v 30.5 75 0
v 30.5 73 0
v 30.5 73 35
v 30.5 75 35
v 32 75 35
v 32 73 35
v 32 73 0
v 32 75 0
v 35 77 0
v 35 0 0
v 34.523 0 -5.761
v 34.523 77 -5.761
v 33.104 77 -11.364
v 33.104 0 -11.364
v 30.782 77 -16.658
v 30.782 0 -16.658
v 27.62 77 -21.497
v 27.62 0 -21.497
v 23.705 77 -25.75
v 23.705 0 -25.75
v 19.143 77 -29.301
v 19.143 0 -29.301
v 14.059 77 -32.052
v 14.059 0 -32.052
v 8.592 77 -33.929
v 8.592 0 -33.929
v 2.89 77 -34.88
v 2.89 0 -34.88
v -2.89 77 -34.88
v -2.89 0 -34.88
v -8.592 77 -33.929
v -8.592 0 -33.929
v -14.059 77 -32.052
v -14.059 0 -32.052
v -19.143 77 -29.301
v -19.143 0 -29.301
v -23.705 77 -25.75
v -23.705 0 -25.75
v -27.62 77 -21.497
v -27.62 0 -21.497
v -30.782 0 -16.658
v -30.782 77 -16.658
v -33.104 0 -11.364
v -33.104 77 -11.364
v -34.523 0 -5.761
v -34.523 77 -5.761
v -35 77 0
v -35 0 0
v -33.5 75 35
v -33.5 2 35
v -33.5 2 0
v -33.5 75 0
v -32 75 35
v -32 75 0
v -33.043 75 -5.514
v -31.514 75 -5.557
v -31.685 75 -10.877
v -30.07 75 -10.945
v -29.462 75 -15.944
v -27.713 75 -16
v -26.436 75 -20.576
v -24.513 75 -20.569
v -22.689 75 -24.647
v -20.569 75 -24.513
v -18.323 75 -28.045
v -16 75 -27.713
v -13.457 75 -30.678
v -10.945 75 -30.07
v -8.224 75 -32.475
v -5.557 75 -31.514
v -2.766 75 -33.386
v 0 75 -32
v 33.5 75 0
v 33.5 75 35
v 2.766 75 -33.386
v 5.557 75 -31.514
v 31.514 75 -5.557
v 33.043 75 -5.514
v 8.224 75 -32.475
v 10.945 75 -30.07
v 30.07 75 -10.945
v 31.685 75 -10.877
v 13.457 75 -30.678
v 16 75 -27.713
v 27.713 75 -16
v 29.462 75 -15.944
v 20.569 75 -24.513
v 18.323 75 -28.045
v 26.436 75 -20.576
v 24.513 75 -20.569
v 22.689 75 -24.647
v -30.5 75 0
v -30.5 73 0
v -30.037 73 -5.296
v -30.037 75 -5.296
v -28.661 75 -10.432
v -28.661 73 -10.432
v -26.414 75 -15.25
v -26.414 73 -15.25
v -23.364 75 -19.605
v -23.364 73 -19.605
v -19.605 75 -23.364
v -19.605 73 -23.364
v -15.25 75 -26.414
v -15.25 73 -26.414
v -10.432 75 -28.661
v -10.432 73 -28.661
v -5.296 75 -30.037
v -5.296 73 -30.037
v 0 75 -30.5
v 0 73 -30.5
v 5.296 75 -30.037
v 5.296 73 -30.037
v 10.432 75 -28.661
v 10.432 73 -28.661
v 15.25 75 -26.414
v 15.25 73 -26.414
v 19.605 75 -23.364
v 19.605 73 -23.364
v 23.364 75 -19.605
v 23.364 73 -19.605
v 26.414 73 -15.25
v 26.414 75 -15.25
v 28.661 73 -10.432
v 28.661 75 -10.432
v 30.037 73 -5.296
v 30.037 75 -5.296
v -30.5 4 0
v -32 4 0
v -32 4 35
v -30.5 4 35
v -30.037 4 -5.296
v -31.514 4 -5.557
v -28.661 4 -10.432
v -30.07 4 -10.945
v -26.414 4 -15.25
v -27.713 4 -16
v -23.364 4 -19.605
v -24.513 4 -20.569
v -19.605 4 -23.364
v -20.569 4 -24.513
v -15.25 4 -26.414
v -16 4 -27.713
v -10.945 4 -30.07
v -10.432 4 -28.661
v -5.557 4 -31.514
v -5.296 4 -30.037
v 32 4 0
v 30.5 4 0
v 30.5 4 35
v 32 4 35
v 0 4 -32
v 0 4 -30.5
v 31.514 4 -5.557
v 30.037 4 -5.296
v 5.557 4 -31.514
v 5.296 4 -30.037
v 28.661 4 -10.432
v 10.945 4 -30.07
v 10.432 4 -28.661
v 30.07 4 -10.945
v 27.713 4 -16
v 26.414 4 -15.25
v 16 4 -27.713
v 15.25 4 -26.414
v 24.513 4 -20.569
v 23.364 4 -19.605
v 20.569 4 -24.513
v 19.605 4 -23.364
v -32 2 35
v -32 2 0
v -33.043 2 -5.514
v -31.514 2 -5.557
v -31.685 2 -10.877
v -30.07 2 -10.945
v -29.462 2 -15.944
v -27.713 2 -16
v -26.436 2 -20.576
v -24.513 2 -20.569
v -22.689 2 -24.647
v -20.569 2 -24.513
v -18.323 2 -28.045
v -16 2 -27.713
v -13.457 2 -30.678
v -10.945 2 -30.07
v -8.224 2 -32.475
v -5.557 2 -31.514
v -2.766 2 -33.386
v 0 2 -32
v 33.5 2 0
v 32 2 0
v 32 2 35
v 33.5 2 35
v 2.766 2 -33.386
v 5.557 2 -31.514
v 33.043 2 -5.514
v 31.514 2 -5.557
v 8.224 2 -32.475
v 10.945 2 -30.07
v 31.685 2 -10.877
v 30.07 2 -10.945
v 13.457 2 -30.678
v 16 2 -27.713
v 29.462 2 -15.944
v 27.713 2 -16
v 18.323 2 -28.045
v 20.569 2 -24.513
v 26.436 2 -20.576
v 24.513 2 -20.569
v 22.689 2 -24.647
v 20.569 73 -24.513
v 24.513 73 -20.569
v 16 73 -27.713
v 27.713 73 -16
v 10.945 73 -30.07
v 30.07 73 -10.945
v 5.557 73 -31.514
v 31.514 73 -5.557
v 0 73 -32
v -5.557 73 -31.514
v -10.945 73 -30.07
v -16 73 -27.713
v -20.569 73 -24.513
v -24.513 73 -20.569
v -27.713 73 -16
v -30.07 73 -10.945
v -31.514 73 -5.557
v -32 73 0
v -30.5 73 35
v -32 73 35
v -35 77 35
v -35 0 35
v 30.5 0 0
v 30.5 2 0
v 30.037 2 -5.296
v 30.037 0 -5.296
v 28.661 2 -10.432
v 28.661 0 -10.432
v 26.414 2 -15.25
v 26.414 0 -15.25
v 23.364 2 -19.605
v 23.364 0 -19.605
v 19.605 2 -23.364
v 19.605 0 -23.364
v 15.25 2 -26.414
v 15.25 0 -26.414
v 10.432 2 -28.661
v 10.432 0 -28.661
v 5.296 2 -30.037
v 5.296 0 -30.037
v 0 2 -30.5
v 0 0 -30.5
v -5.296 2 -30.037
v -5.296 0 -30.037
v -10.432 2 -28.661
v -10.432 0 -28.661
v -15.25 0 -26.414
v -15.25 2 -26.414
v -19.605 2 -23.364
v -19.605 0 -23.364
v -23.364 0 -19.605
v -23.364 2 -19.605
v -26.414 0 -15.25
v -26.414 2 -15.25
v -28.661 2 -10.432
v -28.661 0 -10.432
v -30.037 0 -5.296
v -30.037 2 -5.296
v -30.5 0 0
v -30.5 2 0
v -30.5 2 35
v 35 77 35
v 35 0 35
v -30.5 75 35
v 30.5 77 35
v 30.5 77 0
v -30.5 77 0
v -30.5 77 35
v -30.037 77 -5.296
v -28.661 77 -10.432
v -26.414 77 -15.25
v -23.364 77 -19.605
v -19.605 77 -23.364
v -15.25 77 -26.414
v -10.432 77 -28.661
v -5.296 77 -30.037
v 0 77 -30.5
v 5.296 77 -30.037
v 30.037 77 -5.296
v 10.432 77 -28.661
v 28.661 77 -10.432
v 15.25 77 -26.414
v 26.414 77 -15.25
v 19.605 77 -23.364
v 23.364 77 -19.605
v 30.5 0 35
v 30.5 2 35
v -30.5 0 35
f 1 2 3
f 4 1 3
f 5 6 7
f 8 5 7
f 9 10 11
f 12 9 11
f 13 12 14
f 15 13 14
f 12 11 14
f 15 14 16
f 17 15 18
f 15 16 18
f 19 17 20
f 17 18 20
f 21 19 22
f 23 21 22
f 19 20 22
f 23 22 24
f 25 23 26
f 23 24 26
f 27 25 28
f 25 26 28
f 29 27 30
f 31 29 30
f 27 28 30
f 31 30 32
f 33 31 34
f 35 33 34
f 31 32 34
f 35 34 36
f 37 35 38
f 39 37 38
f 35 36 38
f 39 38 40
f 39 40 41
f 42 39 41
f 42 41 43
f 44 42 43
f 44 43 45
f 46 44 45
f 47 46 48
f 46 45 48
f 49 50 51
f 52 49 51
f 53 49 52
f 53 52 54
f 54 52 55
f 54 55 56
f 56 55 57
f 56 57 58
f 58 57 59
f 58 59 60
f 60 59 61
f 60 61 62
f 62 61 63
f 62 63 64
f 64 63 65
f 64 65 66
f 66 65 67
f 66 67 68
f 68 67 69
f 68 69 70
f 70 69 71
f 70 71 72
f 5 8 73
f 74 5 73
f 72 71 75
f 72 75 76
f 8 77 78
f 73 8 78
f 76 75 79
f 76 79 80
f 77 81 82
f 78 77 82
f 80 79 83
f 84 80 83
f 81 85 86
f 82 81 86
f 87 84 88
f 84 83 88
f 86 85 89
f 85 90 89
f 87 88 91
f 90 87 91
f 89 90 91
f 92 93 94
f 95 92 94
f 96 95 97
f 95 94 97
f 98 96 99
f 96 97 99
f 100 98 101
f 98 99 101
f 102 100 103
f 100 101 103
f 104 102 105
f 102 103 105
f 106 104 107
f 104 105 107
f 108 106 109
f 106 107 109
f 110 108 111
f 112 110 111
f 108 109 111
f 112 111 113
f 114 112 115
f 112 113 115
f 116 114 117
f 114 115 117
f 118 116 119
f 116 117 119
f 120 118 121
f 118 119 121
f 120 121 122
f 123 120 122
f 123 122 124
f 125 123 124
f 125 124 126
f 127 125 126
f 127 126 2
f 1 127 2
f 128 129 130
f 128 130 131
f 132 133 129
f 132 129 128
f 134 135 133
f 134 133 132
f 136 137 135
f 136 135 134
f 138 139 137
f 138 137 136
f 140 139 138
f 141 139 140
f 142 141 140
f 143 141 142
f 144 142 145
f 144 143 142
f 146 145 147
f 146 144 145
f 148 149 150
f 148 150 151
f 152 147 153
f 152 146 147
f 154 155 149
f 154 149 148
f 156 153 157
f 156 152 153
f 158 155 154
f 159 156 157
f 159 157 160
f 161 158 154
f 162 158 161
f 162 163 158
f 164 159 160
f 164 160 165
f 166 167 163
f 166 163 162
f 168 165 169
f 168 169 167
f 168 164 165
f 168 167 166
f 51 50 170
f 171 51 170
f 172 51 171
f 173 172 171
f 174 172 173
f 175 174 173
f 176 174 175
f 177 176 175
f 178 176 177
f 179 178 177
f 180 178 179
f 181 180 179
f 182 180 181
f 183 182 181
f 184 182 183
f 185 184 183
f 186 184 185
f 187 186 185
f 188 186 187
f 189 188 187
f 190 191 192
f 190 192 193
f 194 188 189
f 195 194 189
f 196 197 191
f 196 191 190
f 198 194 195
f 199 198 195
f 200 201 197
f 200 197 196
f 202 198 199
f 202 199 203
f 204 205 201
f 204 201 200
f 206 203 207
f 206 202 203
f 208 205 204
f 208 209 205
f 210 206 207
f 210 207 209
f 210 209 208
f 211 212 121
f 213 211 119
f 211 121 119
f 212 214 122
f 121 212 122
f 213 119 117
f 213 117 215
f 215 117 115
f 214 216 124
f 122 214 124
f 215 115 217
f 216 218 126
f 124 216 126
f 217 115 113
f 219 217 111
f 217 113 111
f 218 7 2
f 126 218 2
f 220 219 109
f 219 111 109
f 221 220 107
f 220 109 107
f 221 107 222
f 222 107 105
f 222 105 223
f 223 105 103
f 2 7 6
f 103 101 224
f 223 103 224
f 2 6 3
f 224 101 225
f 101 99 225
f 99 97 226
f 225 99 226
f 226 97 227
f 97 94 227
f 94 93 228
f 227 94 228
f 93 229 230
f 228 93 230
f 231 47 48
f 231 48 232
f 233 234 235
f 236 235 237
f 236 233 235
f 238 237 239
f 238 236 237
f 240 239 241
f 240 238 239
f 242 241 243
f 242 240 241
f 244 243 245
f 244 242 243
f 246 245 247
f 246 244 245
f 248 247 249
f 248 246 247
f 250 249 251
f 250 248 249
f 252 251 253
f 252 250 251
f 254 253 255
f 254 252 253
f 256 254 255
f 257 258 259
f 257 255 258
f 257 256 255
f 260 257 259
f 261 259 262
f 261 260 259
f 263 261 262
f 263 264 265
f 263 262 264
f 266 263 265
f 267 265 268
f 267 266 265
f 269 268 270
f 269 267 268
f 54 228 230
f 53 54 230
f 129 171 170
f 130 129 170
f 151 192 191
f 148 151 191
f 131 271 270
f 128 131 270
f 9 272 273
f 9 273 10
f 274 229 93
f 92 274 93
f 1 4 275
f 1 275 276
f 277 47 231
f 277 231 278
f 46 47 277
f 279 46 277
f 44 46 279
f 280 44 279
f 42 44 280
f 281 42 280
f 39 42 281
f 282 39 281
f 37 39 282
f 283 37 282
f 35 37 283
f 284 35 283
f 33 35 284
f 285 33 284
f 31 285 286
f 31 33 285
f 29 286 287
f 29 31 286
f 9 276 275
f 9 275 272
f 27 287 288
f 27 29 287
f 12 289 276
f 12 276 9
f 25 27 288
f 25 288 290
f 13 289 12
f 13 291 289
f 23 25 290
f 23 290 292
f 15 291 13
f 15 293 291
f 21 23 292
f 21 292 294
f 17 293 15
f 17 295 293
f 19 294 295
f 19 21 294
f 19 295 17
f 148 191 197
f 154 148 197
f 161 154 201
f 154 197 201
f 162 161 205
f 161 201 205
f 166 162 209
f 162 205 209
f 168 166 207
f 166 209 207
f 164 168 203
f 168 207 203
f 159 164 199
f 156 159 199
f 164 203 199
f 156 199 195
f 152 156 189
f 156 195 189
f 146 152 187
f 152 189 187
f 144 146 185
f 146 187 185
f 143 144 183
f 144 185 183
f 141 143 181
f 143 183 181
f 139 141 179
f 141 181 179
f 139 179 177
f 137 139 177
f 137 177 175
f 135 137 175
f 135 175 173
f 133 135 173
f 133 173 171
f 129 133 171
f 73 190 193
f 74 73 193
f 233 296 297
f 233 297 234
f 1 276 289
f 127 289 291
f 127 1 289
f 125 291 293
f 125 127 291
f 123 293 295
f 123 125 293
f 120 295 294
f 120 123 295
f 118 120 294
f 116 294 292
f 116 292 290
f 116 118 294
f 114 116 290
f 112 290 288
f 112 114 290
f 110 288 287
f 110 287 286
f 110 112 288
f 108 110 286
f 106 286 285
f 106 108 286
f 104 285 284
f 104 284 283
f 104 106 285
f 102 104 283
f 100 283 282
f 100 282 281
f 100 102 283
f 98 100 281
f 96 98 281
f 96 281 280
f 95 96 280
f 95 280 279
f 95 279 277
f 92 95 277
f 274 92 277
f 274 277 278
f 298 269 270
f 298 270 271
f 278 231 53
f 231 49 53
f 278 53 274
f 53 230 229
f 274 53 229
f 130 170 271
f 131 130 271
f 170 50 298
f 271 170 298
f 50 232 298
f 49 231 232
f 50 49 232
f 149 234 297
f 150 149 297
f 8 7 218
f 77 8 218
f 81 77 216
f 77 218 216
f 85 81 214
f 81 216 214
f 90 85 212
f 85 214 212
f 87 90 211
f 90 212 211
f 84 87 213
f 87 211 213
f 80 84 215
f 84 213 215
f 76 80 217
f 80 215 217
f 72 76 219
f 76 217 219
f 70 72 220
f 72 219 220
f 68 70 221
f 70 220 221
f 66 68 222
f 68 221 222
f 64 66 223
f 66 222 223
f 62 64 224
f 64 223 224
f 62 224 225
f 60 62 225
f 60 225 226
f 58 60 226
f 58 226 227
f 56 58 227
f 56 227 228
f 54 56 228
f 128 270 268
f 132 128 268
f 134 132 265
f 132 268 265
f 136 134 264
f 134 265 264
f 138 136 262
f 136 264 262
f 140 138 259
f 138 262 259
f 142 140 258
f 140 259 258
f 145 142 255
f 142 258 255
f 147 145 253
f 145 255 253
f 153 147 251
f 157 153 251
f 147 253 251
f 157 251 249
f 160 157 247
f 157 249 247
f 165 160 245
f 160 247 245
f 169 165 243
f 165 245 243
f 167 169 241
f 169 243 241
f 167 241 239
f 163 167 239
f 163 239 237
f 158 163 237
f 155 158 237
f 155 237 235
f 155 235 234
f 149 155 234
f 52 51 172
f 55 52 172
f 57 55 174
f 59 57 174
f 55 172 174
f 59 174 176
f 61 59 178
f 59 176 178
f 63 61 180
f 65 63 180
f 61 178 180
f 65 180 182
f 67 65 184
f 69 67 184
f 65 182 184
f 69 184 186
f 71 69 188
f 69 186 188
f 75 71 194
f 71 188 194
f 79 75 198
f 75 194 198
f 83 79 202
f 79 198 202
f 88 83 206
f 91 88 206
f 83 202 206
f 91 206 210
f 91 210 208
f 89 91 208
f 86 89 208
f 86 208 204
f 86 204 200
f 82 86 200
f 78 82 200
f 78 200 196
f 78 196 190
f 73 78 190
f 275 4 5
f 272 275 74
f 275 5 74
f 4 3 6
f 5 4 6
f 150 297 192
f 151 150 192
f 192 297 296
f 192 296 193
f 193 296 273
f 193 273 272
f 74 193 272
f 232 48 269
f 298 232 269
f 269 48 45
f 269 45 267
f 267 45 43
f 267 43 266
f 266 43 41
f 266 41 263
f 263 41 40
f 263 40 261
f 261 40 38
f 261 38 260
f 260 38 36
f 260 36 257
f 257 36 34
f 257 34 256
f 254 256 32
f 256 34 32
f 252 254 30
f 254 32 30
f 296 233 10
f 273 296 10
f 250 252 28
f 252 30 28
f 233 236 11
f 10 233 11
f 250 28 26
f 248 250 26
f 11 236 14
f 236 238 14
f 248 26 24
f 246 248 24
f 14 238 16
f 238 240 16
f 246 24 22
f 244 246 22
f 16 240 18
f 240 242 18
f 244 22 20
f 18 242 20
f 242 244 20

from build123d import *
from build123d.topology import SkipClean

# Parameters (mm, degrees)
EXTRUDE_1_DEPTH     = 2
EXTRUDE_2_DEPTH     = 73
EXTRUDE_3_DEPTH     = 2
EXTRUDE_4_DEPTH     = 2
EXTRUDE_START       = 2
EXTRUDE_5_DEPTH     = 2
CUT_EXTRUDE_START   = -80
CUT_EXTRUDE_1_DEPTH = 80


with BuildPart() as part:
    # 草图1 → 凸台-拉伸1 (new body)
    with BuildSketch(Plane(origin=(0, 0, 0), x_dir=(1, 0, 0), z_dir=(0, 1, 0))):
        with BuildLine():
            Line((-35, 0), (-35, -35))
            Line((-35, -35), (35, -35))
            Line((35, -35), (35, 0))
            ThreePointArc((35, 0), (0, 35), (-35, 0))
        make_face()
    extrude(amount=EXTRUDE_1_DEPTH)

    # 草图5 → 凸台-拉伸2 (add)
    with BuildSketch(Plane(origin=(0, 2, 0), x_dir=(1, 0, 0), z_dir=(0, 1, 0))):
        with BuildLine():
            Line((33.5, -35), (35, -35))
            Line((35, -35), (35, 0))
            ThreePointArc((35, 0), (0, 35), (-35, 0))
            Line((-35, 0), (-35, -35))
            Line((-35, -35), (-33.5, -35))
            Line((-33.5, -35), (-33.5, 0))
            ThreePointArc((-33.5, 0), (0, 33.5), (33.5, 0))
            Line((33.5, 0), (33.5, -35))
        make_face()
    extrude(amount=EXTRUDE_2_DEPTH)

    # 草图6 → 凸台-拉伸3 (add)
    with BuildSketch(Plane(origin=(0, 2, 0), x_dir=(1, 0, 0), z_dir=(0, 1, 0))):
        with BuildLine():
            Line((-32, 0), (-32, -35))
            Line((-32, -35), (-30.5, -35))
            Line((-30.5, -35), (-30.5, 0))
            ThreePointArc((-30.5, 0), (0, 30.5), (30.5, 0))
            Line((30.5, 0), (30.5, -35))
            Line((30.5, -35), (32, -35))
            Line((32, -35), (32, 0))
            ThreePointArc((32, 0), (0, 32), (-32, 0))
        make_face()
    extrude(amount=EXTRUDE_3_DEPTH)

    # 草图8 → 凸台-拉伸4 (add)
    with BuildSketch(Plane(origin=(0, 75, 0), x_dir=(1, 0, 0), z_dir=(0, 1, 0))):
        with BuildLine():
            Line((-35, 0), (-35, -35))
            Line((-35, -35), (35, -35))
            Line((35, -35), (35, 0))
            ThreePointArc((35, 0), (0, 35), (-35, 0))
        make_face()
    extrude(amount=EXTRUDE_4_DEPTH)

    # 草图10 → 凸台-拉伸5 (add)
    with BuildSketch(Plane.XZ.offset(-75).offset(EXTRUDE_START)):
        with BuildLine():
            Line((-32, 0), (-32, 35))
            Line((-32, 35), (-30.5, 35))
            Line((-30.5, 35), (-30.5, 0))
            ThreePointArc((-30.5, 0), (0, -30.5), (30.5, 0))
            Line((30.5, 0), (30.5, 35))
            Line((30.5, 35), (32, 35))
            Line((32, 35), (32, 0))
            ThreePointArc((32, 0), (0, -32), (-32, 0))
        make_face()
    extrude(amount=-EXTRUDE_5_DEPTH)

    # 草图12 → 切除-拉伸1 (cut)
    with SkipClean():  # the faces are left unmerged after this step: merging them gives an invalid solid
        with BuildSketch(Plane(origin=(0, 77, 0), x_dir=(1, 0, 0), z_dir=(0, 1, 0)).offset(CUT_EXTRUDE_START)):
            with BuildLine():
                Line((-30.5, -30.5), (-30.5, -35))
                Line((-30.5, -35), (30.5, -35))
                Line((30.5, -35), (30.5, -30.5))
                Line((30.5, -30.5), (30.5, 0))
                ThreePointArc((30.5, 0), (0, 30.5), (-30.5, 0))
                Line((-30.5, 0), (-30.5, -30.5))
            make_face()
        extrude(amount=CUT_EXTRUDE_1_DEPTH, mode=Mode.SUBTRACT)


solid = part.part
